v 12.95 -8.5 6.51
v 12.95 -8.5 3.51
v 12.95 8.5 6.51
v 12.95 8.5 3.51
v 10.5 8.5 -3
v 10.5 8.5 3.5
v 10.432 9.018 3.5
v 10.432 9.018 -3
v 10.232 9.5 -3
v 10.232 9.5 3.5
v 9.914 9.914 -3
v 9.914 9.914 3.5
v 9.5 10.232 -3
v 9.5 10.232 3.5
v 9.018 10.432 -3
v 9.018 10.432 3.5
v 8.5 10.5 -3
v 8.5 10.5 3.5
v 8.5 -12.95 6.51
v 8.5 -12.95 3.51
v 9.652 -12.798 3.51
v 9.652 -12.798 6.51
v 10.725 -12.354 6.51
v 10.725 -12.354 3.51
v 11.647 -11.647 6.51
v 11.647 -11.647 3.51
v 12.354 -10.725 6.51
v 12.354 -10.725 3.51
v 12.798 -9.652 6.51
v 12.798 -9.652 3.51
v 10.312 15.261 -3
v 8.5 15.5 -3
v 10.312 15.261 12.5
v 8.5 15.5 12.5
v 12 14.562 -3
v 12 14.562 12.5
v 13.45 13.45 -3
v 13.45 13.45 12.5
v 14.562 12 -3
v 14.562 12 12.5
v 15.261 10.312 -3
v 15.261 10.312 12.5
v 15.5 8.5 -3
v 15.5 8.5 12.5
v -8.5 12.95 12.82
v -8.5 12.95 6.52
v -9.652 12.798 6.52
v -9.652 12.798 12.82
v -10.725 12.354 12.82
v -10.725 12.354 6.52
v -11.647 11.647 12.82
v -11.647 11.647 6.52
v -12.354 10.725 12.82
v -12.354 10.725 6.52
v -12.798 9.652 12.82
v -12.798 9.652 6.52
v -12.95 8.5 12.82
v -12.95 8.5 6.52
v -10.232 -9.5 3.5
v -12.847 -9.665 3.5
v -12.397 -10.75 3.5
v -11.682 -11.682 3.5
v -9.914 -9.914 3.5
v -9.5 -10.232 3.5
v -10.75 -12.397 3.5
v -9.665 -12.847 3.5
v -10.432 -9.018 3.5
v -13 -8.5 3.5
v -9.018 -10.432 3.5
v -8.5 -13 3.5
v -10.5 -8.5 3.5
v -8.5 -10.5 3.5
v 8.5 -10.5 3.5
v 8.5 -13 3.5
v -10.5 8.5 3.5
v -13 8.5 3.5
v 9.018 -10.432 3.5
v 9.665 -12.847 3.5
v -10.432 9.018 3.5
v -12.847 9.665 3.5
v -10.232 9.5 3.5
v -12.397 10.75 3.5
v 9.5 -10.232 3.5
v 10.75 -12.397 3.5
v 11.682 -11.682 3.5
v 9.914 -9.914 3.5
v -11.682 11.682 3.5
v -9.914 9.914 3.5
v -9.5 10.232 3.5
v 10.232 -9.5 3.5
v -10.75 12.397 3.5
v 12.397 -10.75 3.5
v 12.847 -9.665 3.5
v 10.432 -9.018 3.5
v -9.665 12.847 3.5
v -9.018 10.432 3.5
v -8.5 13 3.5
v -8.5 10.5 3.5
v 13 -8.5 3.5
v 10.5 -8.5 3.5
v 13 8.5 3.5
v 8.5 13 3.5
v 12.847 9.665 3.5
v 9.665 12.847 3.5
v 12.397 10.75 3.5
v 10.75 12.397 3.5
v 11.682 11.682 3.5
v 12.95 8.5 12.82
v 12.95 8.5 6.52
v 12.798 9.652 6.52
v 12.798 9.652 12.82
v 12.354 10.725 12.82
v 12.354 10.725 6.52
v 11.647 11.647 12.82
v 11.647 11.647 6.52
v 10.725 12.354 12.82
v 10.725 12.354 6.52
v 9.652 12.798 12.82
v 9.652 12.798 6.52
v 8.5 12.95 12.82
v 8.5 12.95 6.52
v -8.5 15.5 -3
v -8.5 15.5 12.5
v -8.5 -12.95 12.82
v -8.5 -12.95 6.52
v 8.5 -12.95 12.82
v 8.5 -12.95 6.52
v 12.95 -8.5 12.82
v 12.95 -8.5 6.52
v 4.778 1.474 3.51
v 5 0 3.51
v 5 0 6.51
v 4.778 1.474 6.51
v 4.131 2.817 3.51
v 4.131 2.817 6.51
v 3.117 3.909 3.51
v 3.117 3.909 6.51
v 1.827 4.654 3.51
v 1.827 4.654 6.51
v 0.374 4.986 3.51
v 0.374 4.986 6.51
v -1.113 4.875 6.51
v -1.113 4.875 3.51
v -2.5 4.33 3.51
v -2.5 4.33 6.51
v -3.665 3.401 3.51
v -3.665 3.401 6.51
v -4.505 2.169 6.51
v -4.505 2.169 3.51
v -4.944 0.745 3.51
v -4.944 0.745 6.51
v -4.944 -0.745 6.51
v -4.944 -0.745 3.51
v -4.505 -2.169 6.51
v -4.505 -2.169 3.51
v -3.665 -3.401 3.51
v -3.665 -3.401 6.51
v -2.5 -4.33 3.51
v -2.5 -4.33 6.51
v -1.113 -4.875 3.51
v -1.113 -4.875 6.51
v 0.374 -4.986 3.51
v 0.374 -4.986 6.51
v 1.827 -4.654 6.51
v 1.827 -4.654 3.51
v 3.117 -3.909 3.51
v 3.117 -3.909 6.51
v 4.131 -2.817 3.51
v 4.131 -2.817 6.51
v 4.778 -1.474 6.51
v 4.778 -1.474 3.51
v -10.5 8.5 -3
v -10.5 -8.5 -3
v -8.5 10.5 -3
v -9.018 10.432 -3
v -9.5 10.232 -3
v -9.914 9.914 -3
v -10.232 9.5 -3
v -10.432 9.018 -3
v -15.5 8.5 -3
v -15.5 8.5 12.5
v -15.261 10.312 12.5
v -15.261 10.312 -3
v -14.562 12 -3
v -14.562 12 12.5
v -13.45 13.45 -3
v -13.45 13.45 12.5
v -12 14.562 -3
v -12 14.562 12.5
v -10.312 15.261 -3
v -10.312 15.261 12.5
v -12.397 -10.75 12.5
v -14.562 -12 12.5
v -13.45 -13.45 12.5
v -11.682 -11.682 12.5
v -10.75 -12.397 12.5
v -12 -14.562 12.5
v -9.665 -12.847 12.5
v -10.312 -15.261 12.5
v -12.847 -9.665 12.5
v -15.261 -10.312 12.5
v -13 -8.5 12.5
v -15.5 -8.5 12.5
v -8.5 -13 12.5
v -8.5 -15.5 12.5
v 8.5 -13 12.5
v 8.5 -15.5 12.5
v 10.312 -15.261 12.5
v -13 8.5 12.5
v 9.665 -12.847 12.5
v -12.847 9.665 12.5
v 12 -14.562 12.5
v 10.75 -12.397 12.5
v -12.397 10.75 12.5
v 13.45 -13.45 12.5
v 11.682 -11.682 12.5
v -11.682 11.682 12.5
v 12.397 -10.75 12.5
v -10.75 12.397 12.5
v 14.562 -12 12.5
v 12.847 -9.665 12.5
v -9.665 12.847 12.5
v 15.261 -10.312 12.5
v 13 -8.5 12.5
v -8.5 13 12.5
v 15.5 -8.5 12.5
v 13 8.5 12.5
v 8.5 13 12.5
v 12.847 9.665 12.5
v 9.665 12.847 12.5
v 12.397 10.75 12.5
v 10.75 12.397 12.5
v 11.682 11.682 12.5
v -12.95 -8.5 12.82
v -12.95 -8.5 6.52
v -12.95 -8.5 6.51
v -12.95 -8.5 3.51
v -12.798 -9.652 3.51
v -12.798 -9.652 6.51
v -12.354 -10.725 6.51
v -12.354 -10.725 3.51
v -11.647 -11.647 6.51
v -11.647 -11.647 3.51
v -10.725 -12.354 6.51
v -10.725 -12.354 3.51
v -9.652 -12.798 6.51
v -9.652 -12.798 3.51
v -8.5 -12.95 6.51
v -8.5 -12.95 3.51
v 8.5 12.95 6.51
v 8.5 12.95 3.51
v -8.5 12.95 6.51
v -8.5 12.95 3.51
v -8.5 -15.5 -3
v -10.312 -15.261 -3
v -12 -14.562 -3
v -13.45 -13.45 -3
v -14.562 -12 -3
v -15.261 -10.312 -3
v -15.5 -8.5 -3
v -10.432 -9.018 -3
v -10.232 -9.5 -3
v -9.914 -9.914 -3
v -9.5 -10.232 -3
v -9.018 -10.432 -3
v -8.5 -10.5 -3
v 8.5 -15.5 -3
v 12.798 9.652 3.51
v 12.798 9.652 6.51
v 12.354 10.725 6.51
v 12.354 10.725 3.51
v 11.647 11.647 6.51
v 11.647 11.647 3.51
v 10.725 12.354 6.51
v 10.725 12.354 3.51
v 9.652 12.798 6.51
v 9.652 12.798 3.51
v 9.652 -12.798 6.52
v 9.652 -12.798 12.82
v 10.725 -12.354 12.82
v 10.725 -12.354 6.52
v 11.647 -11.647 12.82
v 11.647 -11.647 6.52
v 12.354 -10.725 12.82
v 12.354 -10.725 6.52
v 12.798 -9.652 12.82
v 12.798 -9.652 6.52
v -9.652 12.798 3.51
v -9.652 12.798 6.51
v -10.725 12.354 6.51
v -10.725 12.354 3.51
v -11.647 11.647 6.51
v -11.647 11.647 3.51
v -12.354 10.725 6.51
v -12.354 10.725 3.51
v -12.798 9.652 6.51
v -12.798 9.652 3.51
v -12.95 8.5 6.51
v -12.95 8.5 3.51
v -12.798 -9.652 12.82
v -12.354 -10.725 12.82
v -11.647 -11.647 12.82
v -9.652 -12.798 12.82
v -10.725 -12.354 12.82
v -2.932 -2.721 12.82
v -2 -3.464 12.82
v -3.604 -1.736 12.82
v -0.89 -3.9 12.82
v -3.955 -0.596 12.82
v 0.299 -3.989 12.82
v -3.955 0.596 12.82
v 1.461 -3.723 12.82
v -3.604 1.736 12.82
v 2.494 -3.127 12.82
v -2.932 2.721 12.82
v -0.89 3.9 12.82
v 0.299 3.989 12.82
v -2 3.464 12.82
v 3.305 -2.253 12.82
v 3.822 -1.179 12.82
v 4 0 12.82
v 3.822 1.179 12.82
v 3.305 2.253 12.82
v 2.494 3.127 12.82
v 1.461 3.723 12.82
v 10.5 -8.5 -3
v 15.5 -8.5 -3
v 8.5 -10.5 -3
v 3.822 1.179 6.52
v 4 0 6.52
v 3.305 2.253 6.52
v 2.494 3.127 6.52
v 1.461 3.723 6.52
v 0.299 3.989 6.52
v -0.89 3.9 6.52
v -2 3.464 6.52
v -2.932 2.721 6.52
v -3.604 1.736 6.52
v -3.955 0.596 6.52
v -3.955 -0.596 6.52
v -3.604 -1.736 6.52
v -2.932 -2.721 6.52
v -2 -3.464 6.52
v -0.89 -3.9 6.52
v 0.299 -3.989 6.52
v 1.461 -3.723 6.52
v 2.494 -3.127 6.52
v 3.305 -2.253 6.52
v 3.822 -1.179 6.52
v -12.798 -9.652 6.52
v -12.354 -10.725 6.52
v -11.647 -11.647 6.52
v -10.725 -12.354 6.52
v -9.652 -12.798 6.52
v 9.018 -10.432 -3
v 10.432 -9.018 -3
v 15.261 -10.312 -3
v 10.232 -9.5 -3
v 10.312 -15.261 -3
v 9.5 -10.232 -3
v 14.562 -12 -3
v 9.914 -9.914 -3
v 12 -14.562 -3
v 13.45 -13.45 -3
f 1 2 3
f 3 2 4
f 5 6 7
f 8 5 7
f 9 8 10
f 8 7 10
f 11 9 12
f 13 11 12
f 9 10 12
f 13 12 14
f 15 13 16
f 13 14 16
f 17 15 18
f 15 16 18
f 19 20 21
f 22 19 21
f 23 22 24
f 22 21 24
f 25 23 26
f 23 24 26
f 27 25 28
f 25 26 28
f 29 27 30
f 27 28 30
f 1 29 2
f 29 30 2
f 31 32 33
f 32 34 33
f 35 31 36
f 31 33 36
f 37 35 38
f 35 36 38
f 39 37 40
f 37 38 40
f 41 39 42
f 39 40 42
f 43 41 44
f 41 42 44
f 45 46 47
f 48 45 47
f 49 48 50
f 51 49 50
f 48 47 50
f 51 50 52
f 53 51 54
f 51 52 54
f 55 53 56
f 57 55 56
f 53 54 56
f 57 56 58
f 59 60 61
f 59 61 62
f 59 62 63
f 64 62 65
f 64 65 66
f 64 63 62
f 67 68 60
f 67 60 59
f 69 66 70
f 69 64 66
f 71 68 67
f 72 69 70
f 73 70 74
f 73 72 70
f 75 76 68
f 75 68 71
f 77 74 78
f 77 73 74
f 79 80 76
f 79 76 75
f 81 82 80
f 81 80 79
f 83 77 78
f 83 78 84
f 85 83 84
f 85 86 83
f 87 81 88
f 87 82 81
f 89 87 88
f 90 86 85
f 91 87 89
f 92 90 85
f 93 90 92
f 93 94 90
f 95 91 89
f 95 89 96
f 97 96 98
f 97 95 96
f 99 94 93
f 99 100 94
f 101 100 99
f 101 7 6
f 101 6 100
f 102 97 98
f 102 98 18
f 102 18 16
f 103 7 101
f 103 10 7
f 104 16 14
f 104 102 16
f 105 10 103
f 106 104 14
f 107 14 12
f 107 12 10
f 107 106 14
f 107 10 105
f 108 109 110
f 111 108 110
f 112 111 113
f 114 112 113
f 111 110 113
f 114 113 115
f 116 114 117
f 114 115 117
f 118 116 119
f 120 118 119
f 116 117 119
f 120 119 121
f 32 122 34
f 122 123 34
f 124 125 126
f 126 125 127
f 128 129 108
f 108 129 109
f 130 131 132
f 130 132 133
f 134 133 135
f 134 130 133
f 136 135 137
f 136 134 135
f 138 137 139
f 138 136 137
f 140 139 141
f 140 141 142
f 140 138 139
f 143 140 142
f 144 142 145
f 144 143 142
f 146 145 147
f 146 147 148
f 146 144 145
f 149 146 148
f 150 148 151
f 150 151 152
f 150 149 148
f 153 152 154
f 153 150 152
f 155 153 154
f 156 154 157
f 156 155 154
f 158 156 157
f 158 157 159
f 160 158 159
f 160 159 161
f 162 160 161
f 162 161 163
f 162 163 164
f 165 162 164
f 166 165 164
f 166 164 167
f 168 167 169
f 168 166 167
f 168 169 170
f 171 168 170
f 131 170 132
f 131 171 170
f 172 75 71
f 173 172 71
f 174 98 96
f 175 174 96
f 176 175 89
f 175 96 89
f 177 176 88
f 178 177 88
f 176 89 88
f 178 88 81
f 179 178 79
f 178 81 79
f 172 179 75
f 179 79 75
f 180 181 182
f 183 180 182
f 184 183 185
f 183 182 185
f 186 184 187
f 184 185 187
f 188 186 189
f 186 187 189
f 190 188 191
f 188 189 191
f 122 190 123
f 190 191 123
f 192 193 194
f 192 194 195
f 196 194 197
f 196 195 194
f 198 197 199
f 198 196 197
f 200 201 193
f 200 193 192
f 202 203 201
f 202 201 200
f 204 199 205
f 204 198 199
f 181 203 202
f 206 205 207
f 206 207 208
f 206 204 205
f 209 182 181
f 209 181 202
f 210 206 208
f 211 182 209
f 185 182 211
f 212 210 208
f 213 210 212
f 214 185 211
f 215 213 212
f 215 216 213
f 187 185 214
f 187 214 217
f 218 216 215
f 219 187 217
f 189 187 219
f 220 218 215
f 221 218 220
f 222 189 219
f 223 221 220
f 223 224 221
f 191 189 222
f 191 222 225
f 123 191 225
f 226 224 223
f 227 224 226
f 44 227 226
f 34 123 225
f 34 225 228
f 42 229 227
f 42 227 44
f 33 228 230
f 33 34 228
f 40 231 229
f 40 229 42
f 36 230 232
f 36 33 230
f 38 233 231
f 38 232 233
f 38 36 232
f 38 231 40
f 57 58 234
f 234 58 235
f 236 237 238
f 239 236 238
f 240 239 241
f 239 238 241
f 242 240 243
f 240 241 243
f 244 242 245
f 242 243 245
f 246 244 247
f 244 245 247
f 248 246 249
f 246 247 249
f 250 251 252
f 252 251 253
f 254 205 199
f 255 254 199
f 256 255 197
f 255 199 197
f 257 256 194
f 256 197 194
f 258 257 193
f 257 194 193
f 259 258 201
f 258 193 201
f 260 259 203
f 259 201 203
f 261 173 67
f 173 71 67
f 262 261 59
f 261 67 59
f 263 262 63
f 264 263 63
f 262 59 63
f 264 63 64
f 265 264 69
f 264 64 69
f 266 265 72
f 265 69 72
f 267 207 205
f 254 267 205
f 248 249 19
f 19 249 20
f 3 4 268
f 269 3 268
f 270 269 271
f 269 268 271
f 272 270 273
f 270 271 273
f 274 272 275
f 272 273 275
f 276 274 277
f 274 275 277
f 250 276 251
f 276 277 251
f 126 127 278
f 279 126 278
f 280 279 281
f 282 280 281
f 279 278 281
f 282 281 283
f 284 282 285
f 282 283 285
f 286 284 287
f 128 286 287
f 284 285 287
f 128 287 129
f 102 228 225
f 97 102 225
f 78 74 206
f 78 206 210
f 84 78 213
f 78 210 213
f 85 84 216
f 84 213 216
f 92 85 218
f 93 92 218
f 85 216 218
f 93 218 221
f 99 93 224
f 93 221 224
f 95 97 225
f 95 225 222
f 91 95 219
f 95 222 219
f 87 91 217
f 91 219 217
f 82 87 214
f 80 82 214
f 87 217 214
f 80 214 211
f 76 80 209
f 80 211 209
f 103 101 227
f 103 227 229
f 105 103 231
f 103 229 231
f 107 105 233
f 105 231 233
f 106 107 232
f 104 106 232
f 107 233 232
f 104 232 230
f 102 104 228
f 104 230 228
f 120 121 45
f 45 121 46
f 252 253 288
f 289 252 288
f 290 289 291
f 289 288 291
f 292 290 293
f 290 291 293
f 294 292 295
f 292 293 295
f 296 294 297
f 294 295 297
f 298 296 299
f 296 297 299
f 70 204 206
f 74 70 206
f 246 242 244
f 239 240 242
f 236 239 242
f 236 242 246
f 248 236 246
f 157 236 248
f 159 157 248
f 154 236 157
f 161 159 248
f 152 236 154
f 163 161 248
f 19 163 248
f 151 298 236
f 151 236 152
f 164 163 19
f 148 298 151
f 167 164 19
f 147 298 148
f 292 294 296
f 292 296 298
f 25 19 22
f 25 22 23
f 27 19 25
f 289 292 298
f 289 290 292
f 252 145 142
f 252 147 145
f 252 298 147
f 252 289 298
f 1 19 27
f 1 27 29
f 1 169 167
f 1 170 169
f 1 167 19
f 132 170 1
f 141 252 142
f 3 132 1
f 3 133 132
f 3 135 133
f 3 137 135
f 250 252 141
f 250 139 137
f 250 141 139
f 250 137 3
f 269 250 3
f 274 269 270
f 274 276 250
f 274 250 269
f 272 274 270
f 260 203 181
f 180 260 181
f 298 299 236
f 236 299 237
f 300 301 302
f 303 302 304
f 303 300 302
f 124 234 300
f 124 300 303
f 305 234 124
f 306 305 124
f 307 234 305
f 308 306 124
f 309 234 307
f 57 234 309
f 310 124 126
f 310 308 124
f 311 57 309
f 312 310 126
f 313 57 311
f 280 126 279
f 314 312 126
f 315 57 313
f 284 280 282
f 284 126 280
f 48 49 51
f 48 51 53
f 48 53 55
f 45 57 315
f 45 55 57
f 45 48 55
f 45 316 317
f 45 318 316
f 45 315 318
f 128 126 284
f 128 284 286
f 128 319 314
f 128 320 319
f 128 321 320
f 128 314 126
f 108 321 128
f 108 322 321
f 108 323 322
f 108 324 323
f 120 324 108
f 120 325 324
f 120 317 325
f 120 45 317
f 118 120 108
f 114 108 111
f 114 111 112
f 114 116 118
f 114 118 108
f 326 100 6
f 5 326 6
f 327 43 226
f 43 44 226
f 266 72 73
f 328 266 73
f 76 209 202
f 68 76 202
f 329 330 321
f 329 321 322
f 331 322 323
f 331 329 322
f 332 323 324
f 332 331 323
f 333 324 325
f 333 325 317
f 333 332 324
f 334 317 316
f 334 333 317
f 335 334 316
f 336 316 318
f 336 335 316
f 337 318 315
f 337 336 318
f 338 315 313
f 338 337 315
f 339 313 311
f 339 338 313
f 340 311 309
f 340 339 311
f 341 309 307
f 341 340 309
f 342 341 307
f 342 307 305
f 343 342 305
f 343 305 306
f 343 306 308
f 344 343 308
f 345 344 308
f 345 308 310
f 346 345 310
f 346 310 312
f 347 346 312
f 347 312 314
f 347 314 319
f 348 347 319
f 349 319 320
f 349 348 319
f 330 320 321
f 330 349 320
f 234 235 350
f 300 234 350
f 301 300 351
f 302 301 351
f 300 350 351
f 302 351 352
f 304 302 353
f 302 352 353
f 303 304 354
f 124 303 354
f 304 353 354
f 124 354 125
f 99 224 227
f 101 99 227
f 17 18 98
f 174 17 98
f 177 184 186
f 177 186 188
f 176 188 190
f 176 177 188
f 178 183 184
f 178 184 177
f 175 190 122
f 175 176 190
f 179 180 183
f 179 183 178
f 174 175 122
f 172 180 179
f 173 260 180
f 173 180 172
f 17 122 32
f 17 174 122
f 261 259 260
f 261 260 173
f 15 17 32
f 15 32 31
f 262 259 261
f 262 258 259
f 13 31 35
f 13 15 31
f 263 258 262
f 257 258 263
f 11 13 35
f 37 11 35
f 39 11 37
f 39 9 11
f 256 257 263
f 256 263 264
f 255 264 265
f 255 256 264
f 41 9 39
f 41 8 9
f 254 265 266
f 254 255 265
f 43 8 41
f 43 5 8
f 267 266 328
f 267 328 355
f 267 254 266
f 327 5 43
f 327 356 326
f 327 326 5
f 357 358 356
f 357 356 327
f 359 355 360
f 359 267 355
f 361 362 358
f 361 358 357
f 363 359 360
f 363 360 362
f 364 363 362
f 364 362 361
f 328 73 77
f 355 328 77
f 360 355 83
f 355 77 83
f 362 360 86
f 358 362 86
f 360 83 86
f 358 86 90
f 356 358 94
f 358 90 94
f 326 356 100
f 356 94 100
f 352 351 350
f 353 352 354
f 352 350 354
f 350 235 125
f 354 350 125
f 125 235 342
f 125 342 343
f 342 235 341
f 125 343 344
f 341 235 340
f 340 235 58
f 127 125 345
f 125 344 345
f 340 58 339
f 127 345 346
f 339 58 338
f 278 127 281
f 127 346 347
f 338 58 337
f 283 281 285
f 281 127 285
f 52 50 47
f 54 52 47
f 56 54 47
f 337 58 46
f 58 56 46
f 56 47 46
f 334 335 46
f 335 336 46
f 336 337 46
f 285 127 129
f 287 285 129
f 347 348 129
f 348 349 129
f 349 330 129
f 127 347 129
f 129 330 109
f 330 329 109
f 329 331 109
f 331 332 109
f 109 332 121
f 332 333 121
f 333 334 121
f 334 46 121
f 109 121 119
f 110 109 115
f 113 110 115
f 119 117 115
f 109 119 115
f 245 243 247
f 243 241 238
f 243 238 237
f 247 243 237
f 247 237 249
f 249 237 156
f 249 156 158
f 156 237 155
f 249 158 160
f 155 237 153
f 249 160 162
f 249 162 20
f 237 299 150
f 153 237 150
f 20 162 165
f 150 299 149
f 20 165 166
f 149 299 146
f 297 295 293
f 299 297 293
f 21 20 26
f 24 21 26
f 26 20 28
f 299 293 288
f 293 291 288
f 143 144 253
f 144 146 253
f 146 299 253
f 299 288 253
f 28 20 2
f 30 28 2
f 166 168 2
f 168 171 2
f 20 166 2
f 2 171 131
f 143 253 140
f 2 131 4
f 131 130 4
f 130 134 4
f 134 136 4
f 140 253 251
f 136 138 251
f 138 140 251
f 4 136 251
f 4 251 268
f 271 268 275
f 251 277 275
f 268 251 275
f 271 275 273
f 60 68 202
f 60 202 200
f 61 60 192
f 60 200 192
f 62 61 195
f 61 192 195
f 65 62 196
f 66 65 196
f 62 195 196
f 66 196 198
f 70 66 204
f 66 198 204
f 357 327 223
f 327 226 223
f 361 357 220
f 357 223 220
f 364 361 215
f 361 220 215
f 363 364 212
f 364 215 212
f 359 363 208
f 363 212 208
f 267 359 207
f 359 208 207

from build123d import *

# Parameters (mm, degrees)
F1_DEPTH  = 12.5
F3_DEPTH  = 9
F5_R      = 5
F6_DEPTH  = 3
F8_R      = 4
F9_DEPTH  = 6.3
F11_DEPTH = 3


with BuildPart() as f1:
    # F0 (on Top) → F1 (new body)
    with BuildSketch(Plane.XY):
        with BuildLine():
            Line((8.5, 15.5), (-8.5, 15.5))
            ThreePointArc((-8.5, 15.5), (-13.4497474683, 13.4497474683), (-15.5, 8.5))
            Line((-15.5, 8.5), (-15.5, -8.5))
            ThreePointArc((-15.5, -8.5), (-13.4497474683, -13.4497474683), (-8.5, -15.5))
            Line((-8.5, -15.5), (8.5, -15.5))
            ThreePointArc((8.5, -15.5), (13.4497474683, -13.4497474683), (15.5, -8.5))
            Line((15.5, -8.5), (15.5, 8.5))
            ThreePointArc((15.5, 8.5), (13.4497474683, 13.4497474683), (8.5, 15.5))
        make_face()
        with BuildLine():
            ThreePointArc((-10.5, 8.5), (-9.9142135624, 9.9142135624), (-8.5, 10.5))
            Line((-8.5, 10.5), (8.5, 10.5))
            ThreePointArc((8.5, 10.5), (9.9142135624, 9.9142135624), (10.5, 8.5))
            Line((10.5, 8.5), (10.5, -8.5))
            ThreePointArc((10.5, -8.5), (9.9142135624, -9.9142135624), (8.5, -10.5))
            Line((8.5, -10.5), (-8.5, -10.5))
            ThreePointArc((-8.5, -10.5), (-9.9142135624, -9.9142135624), (-10.5, -8.5))
            Line((-10.5, -8.5), (-10.5, 8.5))
        make_face(mode=Mode.SUBTRACT)
    extrude(amount=F1_DEPTH)

    # F2 (on face) → F3 (cut)
    with BuildSketch(Plane.XY.offset(12.5)):
        with BuildLine():
            Line((8.5, 13), (-8.5, 13))
            ThreePointArc((-8.5, 13), (-11.6819805153, 11.6819805153), (-13, 8.5))
            Line((-13, 8.5), (-13, -8.5))
            ThreePointArc((-13, -8.5), (-11.6819805153, -11.6819805153), (-8.5, -13))
            Line((-8.5, -13), (8.5, -13))
            ThreePointArc((8.5, -13), (11.6819805153, -11.6819805153), (13, -8.5))
            Line((13, -8.5), (13, 8.5))
            ThreePointArc((13, 8.5), (11.6819805153, 11.6819805153), (8.5, 13))
        make_face()
        with BuildLine():
            ThreePointArc((-10.5, 8.5), (-9.9142135624, 9.9142135624), (-8.5, 10.5))
            Line((-8.5, 10.5), (8.5, 10.5))
            ThreePointArc((8.5, 10.5), (9.9142135624, 9.9142135624), (10.5, 8.5))
            Line((10.5, 8.5), (10.5, -8.5))
            ThreePointArc((10.5, -8.5), (9.9142135624, -9.9142135624), (8.5, -10.5))
            Line((8.5, -10.5), (-8.5, -10.5))
            ThreePointArc((-8.5, -10.5), (-9.9142135624, -9.9142135624), (-10.5, -8.5))
            Line((-10.5, -8.5), (-10.5, 8.5))
        make_face(mode=Mode.SUBTRACT)
    extrude(amount=-F3_DEPTH, mode=Mode.SUBTRACT)

    # F10 (on face) → F11 (join)
    with BuildSketch(Plane(origin=(0, 0, 0), x_dir=(1, 0, 0), z_dir=(0, 0, -1))):
        with BuildLine():
            ThreePointArc((-15.5, -8.5), (-13.4497474683, -13.4497474683), (-8.5, -15.5))
            Line((-8.5, -15.5), (8.5, -15.5))
            ThreePointArc((8.5, -15.5), (13.4497474683, -13.4497474683), (15.5, -8.5))
            Line((15.5, -8.5), (15.5, 8.5))
            ThreePointArc((15.5, 8.5), (13.4497474683, 13.4497474683), (8.5, 15.5))
            Line((8.5, 15.5), (-8.5, 15.5))
            ThreePointArc((-8.5, 15.5), (-13.4497474683, 13.4497474683), (-15.5, 8.5))
            Line((-15.5, 8.5), (-15.5, -8.5))
        make_face()
        with BuildLine():
            ThreePointArc((-10.5, 8.5), (-9.9142135624, 9.9142135624), (-8.5, 10.5))
            Line((-8.5, 10.5), (8.5, 10.5))
            ThreePointArc((8.5, 10.5), (9.9142135624, 9.9142135624), (10.5, 8.5))
            Line((10.5, 8.5), (10.5, -8.5))
            ThreePointArc((10.5, -8.5), (9.9142135624, -9.9142135624), (8.5, -10.5))
            Line((8.5, -10.5), (-8.5, -10.5))
            ThreePointArc((-8.5, -10.5), (-9.9142135624, -9.9142135624), (-10.5, -8.5))
            Line((-10.5, -8.5), (-10.5, 8.5))
        make_face(mode=Mode.SUBTRACT)
    extrude(amount=F11_DEPTH)


with BuildPart() as f6:
    # F5 (on offset) → F6 (new body)
    with BuildSketch(Plane.XY.offset(3.51)):
        with BuildLine():
            Line((8.5, 12.95), (-8.5, 12.95))
            ThreePointArc((-8.5, 12.95), (-11.6466251763, 11.6466251763), (-12.95, 8.5))
            Line((-12.95, 8.5), (-12.95, -8.5))
            ThreePointArc((-12.95, -8.5), (-11.6466251763, -11.6466251763), (-8.5, -12.95))
            Line((-8.5, -12.95), (8.5, -12.95))
            ThreePointArc((8.5, -12.95), (11.6466251763, -11.6466251763), (12.95, -8.5))
            Line((12.95, -8.5), (12.95, 8.5))
            ThreePointArc((12.95, 8.5), (11.6466251763, 11.6466251763), (8.5, 12.95))
        make_face()
        Circle(F5_R, mode=Mode.SUBTRACT)
    extrude(amount=F6_DEPTH)


with BuildPart() as f9:
    # F8 (on offset) → F9 (new body)
    with BuildSketch(Plane.XY.offset(6.52)):
        with BuildLine():
            ThreePointArc((12.95, 8.5), (11.6466251763, 11.6466251763), (8.5, 12.95))
            Line((8.5, 12.95), (-8.5, 12.95))
            ThreePointArc((-8.5, 12.95), (-11.6466251763, 11.6466251763), (-12.95, 8.5))
            Line((-12.95, 8.5), (-12.95, -8.5))
            ThreePointArc((-12.95, -8.5), (-11.6466251763, -11.6466251763), (-8.5, -12.95))
            Line((-8.5, -12.95), (8.5, -12.95))
            ThreePointArc((8.5, -12.95), (11.6466251763, -11.6466251763), (12.95, -8.5))
            Line((12.95, -8.5), (12.95, 8.5))
        make_face()
        Circle(F8_R, mode=Mode.SUBTRACT)
    extrude(amount=F9_DEPTH)


solid = Compound([f1.part, f6.part, f9.part])
